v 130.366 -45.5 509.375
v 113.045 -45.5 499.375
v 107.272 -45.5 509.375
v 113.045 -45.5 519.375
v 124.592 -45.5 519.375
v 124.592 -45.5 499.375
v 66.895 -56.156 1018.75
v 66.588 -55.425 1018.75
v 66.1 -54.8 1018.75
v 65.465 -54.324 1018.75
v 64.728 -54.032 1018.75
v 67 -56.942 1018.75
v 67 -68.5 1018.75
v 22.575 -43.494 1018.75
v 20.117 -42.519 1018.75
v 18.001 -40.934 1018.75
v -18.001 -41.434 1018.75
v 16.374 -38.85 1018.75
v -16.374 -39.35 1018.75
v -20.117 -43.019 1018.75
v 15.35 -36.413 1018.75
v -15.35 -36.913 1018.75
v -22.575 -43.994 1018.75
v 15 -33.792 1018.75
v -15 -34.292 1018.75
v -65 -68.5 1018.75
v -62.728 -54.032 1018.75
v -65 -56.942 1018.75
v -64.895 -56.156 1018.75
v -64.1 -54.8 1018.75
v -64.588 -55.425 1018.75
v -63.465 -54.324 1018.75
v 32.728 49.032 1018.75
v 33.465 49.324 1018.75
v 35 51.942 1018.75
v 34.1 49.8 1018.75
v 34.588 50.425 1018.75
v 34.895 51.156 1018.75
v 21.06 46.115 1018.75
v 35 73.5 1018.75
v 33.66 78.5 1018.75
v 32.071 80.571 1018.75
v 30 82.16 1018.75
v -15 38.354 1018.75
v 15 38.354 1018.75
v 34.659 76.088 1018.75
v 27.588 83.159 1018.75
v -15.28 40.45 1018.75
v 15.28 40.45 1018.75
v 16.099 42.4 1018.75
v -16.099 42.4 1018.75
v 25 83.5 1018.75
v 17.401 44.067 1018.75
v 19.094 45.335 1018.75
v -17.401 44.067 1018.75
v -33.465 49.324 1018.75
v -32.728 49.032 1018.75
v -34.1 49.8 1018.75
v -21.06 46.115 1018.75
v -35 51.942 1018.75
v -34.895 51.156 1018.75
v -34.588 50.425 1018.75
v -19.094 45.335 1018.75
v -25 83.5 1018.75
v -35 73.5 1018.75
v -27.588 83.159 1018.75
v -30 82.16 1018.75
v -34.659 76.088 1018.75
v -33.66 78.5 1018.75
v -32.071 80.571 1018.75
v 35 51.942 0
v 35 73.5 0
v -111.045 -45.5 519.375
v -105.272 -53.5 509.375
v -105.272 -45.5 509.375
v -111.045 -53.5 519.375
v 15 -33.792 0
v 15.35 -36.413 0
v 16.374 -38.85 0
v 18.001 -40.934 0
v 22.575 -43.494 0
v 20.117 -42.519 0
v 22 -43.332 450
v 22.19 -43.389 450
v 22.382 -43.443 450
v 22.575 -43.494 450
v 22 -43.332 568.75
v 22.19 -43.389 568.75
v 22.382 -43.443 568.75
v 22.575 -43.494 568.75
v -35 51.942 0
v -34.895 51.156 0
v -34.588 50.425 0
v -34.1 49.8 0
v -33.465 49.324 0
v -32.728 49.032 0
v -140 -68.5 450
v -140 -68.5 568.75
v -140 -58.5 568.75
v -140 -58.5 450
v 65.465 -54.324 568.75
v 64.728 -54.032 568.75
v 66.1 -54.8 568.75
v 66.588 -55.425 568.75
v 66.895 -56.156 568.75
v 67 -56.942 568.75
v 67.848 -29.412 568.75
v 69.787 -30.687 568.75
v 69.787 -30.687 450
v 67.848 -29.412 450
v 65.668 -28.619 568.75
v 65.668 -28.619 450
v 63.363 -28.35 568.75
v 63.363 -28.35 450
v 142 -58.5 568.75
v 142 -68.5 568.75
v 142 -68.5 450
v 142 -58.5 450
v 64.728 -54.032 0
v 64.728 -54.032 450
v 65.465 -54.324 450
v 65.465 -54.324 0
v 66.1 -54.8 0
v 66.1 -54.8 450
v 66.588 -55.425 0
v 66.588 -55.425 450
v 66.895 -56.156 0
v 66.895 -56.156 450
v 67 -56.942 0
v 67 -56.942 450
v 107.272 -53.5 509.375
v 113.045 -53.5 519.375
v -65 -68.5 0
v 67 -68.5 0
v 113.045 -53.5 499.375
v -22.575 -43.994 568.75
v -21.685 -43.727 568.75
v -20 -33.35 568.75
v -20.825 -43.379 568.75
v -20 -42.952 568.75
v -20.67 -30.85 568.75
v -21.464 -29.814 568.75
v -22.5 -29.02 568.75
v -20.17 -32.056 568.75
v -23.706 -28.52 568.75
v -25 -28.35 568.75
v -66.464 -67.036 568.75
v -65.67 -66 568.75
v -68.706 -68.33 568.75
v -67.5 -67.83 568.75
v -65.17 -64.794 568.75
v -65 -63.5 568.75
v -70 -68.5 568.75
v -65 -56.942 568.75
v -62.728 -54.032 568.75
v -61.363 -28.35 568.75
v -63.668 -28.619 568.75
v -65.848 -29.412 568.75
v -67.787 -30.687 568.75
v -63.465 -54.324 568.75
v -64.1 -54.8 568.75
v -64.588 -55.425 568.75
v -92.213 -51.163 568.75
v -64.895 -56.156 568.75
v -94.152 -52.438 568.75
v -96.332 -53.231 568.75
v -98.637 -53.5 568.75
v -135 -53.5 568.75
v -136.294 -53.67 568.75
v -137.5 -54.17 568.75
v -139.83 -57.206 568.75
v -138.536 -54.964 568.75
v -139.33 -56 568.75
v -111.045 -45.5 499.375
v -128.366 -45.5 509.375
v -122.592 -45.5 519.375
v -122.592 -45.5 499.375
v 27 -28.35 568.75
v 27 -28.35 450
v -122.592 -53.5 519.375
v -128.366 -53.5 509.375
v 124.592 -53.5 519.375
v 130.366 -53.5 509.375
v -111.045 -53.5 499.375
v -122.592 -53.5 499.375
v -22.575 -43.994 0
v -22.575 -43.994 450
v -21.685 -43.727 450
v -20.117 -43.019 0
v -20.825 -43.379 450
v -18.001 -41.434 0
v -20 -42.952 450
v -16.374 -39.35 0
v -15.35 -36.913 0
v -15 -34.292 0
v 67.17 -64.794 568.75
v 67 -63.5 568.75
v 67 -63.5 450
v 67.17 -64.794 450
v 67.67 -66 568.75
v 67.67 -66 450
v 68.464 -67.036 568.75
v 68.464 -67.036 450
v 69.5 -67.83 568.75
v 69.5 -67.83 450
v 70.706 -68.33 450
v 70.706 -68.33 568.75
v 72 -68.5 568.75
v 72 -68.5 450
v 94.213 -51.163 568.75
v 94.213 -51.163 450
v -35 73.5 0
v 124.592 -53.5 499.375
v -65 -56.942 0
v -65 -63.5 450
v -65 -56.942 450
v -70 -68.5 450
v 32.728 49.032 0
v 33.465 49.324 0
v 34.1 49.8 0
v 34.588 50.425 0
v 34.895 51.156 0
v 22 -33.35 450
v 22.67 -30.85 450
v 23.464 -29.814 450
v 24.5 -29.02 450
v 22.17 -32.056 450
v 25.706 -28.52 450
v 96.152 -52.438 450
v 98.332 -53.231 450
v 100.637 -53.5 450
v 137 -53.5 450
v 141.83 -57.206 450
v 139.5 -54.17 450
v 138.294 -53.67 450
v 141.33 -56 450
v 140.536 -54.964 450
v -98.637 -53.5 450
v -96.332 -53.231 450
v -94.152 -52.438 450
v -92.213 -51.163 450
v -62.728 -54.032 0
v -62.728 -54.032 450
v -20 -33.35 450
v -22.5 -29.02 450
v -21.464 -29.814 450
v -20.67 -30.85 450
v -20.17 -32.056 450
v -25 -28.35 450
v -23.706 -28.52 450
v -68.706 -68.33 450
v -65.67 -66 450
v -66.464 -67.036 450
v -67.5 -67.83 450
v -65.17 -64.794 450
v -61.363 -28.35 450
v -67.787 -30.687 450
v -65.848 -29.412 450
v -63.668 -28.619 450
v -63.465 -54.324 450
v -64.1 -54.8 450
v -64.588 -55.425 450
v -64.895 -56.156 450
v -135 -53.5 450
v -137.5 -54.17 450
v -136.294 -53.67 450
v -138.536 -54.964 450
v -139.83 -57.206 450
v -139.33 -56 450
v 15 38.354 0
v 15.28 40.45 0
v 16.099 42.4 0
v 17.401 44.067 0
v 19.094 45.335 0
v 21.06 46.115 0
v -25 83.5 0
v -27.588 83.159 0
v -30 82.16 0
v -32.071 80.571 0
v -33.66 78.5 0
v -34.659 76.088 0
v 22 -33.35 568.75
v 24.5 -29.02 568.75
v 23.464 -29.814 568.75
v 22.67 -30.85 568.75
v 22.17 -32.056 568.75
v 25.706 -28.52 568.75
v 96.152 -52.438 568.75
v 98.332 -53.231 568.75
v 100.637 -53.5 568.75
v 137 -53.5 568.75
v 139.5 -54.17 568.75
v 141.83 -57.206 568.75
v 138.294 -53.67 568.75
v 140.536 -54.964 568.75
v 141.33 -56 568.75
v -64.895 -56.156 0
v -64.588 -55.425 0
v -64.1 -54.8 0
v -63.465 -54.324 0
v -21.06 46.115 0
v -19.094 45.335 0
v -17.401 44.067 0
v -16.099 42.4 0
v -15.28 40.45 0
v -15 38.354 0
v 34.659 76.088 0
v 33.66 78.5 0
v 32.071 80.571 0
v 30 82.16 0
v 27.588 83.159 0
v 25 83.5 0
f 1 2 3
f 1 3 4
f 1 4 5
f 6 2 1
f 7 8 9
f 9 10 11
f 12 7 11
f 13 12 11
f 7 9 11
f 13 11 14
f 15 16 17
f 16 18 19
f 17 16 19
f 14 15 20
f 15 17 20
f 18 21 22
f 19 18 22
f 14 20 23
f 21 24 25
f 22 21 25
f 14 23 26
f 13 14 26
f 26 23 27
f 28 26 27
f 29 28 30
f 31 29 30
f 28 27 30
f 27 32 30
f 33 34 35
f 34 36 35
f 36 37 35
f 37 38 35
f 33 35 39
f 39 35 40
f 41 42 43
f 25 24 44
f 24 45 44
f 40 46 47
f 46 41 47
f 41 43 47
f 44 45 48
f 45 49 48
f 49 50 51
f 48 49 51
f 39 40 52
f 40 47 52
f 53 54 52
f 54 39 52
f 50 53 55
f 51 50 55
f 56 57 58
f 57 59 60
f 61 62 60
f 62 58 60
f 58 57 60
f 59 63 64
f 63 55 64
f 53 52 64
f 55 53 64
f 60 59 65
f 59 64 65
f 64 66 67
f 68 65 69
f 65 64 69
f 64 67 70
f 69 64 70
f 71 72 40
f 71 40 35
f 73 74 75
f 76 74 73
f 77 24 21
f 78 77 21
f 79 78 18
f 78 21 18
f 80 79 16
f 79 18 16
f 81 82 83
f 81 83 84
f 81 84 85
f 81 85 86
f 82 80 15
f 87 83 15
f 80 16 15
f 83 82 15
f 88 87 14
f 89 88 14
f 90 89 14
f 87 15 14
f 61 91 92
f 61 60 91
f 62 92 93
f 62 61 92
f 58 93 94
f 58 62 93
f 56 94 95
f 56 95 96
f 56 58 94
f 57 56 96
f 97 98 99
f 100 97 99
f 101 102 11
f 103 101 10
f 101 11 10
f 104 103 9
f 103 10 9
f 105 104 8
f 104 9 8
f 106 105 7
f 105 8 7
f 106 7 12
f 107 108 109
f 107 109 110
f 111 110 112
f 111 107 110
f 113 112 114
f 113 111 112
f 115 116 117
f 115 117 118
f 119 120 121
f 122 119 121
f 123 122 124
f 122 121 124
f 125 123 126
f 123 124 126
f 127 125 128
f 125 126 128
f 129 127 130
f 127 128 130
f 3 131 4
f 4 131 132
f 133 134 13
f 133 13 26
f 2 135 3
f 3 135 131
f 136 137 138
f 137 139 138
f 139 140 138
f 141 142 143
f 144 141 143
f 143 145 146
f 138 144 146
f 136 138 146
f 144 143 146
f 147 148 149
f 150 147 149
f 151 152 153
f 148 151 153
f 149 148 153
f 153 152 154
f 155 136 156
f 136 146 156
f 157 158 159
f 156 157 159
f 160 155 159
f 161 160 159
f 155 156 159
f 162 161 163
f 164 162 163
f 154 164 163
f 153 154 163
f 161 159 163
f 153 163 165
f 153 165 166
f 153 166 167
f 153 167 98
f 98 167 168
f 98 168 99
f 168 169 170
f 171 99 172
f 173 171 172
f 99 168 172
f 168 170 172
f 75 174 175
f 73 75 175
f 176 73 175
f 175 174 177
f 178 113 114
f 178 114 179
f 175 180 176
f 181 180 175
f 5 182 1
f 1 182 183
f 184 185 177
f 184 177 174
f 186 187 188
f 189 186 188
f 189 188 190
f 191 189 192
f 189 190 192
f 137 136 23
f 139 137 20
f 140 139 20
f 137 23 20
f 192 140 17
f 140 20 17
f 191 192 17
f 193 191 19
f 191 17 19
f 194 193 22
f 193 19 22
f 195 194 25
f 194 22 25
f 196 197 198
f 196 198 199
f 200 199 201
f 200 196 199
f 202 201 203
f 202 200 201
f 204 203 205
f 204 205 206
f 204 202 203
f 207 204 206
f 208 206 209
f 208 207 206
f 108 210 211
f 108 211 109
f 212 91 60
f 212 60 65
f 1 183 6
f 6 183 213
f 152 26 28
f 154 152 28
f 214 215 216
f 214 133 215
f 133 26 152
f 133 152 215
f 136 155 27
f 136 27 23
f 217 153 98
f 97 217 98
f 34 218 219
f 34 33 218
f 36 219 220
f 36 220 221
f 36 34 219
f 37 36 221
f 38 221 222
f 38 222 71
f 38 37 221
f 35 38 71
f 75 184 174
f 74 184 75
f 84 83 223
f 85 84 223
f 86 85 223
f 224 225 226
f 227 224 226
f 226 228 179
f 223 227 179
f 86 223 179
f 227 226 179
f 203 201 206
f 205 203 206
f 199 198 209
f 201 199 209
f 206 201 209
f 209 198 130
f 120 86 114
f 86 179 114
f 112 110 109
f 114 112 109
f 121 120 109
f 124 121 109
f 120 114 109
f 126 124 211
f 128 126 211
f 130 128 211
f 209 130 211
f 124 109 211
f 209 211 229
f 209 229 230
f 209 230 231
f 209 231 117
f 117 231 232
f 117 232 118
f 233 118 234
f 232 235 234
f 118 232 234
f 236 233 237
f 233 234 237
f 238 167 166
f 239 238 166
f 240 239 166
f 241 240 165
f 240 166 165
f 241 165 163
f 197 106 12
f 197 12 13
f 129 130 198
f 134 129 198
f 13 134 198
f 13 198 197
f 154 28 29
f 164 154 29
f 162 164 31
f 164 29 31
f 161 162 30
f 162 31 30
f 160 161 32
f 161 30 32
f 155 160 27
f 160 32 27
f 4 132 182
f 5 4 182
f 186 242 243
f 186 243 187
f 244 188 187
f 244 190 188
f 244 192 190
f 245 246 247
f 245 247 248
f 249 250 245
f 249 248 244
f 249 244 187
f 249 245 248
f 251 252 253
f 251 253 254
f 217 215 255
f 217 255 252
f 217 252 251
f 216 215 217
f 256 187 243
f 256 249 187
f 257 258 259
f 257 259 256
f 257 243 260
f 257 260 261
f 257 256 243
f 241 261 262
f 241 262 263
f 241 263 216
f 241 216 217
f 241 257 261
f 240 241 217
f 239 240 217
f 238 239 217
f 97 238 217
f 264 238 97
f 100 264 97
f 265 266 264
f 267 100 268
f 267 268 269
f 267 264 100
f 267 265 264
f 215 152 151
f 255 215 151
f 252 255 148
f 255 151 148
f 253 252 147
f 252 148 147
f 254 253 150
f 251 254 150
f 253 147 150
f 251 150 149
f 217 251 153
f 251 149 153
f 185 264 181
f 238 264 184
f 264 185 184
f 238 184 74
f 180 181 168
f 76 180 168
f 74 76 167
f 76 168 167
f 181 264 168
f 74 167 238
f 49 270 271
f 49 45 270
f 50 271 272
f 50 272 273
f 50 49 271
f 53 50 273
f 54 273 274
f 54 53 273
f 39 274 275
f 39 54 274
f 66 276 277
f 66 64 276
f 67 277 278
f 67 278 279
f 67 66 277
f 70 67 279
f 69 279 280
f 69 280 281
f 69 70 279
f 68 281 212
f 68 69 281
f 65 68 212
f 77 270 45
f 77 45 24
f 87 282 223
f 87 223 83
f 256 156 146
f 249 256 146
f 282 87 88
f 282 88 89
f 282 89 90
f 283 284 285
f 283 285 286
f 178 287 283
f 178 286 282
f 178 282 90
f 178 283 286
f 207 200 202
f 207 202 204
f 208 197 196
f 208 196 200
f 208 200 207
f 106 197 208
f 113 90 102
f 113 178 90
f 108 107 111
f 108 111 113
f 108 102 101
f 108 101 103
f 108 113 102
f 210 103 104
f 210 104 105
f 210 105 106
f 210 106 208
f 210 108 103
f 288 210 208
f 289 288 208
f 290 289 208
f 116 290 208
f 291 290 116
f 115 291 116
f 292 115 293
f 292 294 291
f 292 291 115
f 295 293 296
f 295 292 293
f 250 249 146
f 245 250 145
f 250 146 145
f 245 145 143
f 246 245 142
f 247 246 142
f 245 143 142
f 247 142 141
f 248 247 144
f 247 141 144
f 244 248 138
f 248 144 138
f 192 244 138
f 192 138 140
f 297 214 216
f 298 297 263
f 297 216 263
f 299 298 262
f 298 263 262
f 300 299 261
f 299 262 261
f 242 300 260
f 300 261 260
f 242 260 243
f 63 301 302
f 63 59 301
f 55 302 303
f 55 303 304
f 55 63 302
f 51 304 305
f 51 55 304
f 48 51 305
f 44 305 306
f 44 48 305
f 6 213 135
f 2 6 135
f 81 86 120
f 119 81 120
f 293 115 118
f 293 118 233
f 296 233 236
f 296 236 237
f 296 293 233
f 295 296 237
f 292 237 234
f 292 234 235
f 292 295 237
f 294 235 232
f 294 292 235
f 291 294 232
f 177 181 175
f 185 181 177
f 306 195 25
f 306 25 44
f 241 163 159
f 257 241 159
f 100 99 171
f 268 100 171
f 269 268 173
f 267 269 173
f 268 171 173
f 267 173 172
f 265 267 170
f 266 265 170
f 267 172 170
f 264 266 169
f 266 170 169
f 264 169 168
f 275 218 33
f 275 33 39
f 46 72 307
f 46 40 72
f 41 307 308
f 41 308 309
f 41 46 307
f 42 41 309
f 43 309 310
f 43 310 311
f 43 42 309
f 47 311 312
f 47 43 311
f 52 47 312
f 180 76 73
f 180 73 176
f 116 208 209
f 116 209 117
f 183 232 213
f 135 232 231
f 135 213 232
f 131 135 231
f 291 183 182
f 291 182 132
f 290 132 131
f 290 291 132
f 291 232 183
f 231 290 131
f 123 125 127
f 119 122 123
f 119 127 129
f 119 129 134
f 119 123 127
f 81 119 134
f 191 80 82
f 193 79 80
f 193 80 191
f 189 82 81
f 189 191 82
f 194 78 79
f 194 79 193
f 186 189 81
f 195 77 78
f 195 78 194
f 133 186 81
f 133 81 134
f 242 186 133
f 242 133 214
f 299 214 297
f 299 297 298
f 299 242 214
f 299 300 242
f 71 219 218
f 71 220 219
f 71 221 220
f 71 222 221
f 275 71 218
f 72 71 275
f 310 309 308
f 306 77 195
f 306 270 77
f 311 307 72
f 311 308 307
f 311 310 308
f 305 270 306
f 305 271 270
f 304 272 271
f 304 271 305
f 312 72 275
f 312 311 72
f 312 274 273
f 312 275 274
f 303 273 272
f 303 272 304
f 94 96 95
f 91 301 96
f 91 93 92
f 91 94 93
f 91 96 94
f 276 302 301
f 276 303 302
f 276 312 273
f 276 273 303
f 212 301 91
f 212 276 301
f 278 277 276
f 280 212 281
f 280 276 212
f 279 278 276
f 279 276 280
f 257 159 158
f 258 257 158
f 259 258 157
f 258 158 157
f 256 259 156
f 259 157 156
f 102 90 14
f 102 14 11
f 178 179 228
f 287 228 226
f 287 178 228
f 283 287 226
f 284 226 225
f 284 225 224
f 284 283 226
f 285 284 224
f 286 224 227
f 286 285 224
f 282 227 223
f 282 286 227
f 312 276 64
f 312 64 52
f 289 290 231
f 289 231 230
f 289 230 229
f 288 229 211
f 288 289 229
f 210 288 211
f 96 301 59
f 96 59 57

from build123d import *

# Parameters (mm, degrees)
EXTRUDE_1_DEPTH   = 1018.75
FILLET_1_R        = 10
FILLET_2_R        = 8
FILLET_3_R        = 3
FILLET_4_R        = 10
FILLET_5_R        = 3
EXTRUDE_START     = 118.75
EXTRUDE_1_2_DEPTH = 118.75
EXTRUDE_2_DEPTH   = 8


with BuildPart() as part:
    # 草图1 → Extrude 1 (new body)
    with BuildSketch(Plane.XY):
        Polygon((-35, 49.6), (-35, 83.5), (35, 83.5), (35, 49.6), (15, 44.6), (15, -41.6), (67, -54.6), (67, -68.5), (-65, -68.5), (-65, -54.6), (-15, -42.1), (-15, 44.6), align=None)
    extrude(amount=EXTRUDE_1_DEPTH)

    # 圆角1
    fillet_1_edges = [part.edges().sort_by_distance(p)[0] for p in [
        (15, -41.6, 509.375),
        (-15, -42.1, 509.375),
    ]]
    fillet(fillet_1_edges, radius=FILLET_1_R)

    # 圆角2
    fillet_2_edges = [part.edges().sort_by_distance(p)[0] for p in [
        (15, 44.6, 509.375),
        (-15, 44.6, 509.375),
    ]]
    fillet(fillet_2_edges, radius=FILLET_2_R)

    # 圆角3
    fillet_3_edges = [part.edges().sort_by_distance(p)[0] for p in [
        (-35, 49.6, 509.375),
        (35, 49.6, 509.375),
    ]]
    fillet(fillet_3_edges, radius=FILLET_3_R)

    # 圆角4
    fillet_4_edges = [part.edges().sort_by_distance(p)[0] for p in [
        (-35, 83.5, 509.375),
        (35, 83.5, 509.375),
    ]]
    fillet(fillet_4_edges, radius=FILLET_4_R)

    # 圆角5
    fillet_5_edges = [part.edges().sort_by_distance(p)[0] for p in [
        (67, -54.6, 509.375),
        (-65, -54.6, 509.375),
    ]]
    fillet(fillet_5_edges, radius=FILLET_5_R)

    # 草图4 → Extrude 1 2 (add)
    with BuildSketch(Plane.XY.offset(450).offset(EXTRUDE_START)):
        with BuildLine():
            Line((142, -68.5), (142, -58.5))
            ThreePointArc((142, -58.5), (140.535533906, -54.964466094), (137, -53.5))
            Line((137, -53.5), (100.637155323, -53.5))
            ThreePointArc((100.637155323, -53.5), (97.219067588, -52.897695262), (94.212725941, -51.163335247))
            Line((94.212725941, -51.163335247), (69.787274059, -30.686664753))
            ThreePointArc((69.787274059, -30.686664753), (66.780932412, -28.952304738), (63.362844677, -28.35))
            Line((63.362844677, -28.35), (27, -28.35))
            ThreePointArc((27, -28.35), (23.464466094, -29.814466094), (22, -33.35))
            Line((22, -33.35), (22, -43.35))
            Line((22, -43.35), (64.727606875, -54.031901719))
            ThreePointArc((64.727606875, -54.031901719), (66.364616314, -55.096092591), (67, -56.942329219))
            Line((67, -56.942329219), (67, -63.5))
            ThreePointArc((67, -63.5), (68.464466094, -67.035533906), (72, -68.5))
            Line((72, -68.5), (142, -68.5))
        make_face()
    extrude_1_2 = extrude(amount=-EXTRUDE_1_2_DEPTH)

    # 草图5 → 凸台-拉伸2 (add)
    with BuildSketch(Plane(origin=(0, -53.5, 0), x_dir=(1, 0, 0), z_dir=(0, 1, 0))):
        Polygon((124.592080354, -519.375), (130.365583045, -509.375), (124.592080354, -499.375), (113.04507497, -499.375), (107.271572278, -509.375), (113.04507497, -519.375), align=None)
    extrude_2 = extrude(amount=EXTRUDE_2_DEPTH)

    # 镜向1: Extrude 1 2, 凸台-拉伸2 across plane
    add(extrude_1_2.mirror(Plane(origin=(1, 0, 0), x_dir=(0, 0, 1), z_dir=(1, 0, 0))))
    add(extrude_2.mirror(Plane(origin=(1, 0, 0), x_dir=(0, 0, 1), z_dir=(1, 0, 0))))


solid = part.part
